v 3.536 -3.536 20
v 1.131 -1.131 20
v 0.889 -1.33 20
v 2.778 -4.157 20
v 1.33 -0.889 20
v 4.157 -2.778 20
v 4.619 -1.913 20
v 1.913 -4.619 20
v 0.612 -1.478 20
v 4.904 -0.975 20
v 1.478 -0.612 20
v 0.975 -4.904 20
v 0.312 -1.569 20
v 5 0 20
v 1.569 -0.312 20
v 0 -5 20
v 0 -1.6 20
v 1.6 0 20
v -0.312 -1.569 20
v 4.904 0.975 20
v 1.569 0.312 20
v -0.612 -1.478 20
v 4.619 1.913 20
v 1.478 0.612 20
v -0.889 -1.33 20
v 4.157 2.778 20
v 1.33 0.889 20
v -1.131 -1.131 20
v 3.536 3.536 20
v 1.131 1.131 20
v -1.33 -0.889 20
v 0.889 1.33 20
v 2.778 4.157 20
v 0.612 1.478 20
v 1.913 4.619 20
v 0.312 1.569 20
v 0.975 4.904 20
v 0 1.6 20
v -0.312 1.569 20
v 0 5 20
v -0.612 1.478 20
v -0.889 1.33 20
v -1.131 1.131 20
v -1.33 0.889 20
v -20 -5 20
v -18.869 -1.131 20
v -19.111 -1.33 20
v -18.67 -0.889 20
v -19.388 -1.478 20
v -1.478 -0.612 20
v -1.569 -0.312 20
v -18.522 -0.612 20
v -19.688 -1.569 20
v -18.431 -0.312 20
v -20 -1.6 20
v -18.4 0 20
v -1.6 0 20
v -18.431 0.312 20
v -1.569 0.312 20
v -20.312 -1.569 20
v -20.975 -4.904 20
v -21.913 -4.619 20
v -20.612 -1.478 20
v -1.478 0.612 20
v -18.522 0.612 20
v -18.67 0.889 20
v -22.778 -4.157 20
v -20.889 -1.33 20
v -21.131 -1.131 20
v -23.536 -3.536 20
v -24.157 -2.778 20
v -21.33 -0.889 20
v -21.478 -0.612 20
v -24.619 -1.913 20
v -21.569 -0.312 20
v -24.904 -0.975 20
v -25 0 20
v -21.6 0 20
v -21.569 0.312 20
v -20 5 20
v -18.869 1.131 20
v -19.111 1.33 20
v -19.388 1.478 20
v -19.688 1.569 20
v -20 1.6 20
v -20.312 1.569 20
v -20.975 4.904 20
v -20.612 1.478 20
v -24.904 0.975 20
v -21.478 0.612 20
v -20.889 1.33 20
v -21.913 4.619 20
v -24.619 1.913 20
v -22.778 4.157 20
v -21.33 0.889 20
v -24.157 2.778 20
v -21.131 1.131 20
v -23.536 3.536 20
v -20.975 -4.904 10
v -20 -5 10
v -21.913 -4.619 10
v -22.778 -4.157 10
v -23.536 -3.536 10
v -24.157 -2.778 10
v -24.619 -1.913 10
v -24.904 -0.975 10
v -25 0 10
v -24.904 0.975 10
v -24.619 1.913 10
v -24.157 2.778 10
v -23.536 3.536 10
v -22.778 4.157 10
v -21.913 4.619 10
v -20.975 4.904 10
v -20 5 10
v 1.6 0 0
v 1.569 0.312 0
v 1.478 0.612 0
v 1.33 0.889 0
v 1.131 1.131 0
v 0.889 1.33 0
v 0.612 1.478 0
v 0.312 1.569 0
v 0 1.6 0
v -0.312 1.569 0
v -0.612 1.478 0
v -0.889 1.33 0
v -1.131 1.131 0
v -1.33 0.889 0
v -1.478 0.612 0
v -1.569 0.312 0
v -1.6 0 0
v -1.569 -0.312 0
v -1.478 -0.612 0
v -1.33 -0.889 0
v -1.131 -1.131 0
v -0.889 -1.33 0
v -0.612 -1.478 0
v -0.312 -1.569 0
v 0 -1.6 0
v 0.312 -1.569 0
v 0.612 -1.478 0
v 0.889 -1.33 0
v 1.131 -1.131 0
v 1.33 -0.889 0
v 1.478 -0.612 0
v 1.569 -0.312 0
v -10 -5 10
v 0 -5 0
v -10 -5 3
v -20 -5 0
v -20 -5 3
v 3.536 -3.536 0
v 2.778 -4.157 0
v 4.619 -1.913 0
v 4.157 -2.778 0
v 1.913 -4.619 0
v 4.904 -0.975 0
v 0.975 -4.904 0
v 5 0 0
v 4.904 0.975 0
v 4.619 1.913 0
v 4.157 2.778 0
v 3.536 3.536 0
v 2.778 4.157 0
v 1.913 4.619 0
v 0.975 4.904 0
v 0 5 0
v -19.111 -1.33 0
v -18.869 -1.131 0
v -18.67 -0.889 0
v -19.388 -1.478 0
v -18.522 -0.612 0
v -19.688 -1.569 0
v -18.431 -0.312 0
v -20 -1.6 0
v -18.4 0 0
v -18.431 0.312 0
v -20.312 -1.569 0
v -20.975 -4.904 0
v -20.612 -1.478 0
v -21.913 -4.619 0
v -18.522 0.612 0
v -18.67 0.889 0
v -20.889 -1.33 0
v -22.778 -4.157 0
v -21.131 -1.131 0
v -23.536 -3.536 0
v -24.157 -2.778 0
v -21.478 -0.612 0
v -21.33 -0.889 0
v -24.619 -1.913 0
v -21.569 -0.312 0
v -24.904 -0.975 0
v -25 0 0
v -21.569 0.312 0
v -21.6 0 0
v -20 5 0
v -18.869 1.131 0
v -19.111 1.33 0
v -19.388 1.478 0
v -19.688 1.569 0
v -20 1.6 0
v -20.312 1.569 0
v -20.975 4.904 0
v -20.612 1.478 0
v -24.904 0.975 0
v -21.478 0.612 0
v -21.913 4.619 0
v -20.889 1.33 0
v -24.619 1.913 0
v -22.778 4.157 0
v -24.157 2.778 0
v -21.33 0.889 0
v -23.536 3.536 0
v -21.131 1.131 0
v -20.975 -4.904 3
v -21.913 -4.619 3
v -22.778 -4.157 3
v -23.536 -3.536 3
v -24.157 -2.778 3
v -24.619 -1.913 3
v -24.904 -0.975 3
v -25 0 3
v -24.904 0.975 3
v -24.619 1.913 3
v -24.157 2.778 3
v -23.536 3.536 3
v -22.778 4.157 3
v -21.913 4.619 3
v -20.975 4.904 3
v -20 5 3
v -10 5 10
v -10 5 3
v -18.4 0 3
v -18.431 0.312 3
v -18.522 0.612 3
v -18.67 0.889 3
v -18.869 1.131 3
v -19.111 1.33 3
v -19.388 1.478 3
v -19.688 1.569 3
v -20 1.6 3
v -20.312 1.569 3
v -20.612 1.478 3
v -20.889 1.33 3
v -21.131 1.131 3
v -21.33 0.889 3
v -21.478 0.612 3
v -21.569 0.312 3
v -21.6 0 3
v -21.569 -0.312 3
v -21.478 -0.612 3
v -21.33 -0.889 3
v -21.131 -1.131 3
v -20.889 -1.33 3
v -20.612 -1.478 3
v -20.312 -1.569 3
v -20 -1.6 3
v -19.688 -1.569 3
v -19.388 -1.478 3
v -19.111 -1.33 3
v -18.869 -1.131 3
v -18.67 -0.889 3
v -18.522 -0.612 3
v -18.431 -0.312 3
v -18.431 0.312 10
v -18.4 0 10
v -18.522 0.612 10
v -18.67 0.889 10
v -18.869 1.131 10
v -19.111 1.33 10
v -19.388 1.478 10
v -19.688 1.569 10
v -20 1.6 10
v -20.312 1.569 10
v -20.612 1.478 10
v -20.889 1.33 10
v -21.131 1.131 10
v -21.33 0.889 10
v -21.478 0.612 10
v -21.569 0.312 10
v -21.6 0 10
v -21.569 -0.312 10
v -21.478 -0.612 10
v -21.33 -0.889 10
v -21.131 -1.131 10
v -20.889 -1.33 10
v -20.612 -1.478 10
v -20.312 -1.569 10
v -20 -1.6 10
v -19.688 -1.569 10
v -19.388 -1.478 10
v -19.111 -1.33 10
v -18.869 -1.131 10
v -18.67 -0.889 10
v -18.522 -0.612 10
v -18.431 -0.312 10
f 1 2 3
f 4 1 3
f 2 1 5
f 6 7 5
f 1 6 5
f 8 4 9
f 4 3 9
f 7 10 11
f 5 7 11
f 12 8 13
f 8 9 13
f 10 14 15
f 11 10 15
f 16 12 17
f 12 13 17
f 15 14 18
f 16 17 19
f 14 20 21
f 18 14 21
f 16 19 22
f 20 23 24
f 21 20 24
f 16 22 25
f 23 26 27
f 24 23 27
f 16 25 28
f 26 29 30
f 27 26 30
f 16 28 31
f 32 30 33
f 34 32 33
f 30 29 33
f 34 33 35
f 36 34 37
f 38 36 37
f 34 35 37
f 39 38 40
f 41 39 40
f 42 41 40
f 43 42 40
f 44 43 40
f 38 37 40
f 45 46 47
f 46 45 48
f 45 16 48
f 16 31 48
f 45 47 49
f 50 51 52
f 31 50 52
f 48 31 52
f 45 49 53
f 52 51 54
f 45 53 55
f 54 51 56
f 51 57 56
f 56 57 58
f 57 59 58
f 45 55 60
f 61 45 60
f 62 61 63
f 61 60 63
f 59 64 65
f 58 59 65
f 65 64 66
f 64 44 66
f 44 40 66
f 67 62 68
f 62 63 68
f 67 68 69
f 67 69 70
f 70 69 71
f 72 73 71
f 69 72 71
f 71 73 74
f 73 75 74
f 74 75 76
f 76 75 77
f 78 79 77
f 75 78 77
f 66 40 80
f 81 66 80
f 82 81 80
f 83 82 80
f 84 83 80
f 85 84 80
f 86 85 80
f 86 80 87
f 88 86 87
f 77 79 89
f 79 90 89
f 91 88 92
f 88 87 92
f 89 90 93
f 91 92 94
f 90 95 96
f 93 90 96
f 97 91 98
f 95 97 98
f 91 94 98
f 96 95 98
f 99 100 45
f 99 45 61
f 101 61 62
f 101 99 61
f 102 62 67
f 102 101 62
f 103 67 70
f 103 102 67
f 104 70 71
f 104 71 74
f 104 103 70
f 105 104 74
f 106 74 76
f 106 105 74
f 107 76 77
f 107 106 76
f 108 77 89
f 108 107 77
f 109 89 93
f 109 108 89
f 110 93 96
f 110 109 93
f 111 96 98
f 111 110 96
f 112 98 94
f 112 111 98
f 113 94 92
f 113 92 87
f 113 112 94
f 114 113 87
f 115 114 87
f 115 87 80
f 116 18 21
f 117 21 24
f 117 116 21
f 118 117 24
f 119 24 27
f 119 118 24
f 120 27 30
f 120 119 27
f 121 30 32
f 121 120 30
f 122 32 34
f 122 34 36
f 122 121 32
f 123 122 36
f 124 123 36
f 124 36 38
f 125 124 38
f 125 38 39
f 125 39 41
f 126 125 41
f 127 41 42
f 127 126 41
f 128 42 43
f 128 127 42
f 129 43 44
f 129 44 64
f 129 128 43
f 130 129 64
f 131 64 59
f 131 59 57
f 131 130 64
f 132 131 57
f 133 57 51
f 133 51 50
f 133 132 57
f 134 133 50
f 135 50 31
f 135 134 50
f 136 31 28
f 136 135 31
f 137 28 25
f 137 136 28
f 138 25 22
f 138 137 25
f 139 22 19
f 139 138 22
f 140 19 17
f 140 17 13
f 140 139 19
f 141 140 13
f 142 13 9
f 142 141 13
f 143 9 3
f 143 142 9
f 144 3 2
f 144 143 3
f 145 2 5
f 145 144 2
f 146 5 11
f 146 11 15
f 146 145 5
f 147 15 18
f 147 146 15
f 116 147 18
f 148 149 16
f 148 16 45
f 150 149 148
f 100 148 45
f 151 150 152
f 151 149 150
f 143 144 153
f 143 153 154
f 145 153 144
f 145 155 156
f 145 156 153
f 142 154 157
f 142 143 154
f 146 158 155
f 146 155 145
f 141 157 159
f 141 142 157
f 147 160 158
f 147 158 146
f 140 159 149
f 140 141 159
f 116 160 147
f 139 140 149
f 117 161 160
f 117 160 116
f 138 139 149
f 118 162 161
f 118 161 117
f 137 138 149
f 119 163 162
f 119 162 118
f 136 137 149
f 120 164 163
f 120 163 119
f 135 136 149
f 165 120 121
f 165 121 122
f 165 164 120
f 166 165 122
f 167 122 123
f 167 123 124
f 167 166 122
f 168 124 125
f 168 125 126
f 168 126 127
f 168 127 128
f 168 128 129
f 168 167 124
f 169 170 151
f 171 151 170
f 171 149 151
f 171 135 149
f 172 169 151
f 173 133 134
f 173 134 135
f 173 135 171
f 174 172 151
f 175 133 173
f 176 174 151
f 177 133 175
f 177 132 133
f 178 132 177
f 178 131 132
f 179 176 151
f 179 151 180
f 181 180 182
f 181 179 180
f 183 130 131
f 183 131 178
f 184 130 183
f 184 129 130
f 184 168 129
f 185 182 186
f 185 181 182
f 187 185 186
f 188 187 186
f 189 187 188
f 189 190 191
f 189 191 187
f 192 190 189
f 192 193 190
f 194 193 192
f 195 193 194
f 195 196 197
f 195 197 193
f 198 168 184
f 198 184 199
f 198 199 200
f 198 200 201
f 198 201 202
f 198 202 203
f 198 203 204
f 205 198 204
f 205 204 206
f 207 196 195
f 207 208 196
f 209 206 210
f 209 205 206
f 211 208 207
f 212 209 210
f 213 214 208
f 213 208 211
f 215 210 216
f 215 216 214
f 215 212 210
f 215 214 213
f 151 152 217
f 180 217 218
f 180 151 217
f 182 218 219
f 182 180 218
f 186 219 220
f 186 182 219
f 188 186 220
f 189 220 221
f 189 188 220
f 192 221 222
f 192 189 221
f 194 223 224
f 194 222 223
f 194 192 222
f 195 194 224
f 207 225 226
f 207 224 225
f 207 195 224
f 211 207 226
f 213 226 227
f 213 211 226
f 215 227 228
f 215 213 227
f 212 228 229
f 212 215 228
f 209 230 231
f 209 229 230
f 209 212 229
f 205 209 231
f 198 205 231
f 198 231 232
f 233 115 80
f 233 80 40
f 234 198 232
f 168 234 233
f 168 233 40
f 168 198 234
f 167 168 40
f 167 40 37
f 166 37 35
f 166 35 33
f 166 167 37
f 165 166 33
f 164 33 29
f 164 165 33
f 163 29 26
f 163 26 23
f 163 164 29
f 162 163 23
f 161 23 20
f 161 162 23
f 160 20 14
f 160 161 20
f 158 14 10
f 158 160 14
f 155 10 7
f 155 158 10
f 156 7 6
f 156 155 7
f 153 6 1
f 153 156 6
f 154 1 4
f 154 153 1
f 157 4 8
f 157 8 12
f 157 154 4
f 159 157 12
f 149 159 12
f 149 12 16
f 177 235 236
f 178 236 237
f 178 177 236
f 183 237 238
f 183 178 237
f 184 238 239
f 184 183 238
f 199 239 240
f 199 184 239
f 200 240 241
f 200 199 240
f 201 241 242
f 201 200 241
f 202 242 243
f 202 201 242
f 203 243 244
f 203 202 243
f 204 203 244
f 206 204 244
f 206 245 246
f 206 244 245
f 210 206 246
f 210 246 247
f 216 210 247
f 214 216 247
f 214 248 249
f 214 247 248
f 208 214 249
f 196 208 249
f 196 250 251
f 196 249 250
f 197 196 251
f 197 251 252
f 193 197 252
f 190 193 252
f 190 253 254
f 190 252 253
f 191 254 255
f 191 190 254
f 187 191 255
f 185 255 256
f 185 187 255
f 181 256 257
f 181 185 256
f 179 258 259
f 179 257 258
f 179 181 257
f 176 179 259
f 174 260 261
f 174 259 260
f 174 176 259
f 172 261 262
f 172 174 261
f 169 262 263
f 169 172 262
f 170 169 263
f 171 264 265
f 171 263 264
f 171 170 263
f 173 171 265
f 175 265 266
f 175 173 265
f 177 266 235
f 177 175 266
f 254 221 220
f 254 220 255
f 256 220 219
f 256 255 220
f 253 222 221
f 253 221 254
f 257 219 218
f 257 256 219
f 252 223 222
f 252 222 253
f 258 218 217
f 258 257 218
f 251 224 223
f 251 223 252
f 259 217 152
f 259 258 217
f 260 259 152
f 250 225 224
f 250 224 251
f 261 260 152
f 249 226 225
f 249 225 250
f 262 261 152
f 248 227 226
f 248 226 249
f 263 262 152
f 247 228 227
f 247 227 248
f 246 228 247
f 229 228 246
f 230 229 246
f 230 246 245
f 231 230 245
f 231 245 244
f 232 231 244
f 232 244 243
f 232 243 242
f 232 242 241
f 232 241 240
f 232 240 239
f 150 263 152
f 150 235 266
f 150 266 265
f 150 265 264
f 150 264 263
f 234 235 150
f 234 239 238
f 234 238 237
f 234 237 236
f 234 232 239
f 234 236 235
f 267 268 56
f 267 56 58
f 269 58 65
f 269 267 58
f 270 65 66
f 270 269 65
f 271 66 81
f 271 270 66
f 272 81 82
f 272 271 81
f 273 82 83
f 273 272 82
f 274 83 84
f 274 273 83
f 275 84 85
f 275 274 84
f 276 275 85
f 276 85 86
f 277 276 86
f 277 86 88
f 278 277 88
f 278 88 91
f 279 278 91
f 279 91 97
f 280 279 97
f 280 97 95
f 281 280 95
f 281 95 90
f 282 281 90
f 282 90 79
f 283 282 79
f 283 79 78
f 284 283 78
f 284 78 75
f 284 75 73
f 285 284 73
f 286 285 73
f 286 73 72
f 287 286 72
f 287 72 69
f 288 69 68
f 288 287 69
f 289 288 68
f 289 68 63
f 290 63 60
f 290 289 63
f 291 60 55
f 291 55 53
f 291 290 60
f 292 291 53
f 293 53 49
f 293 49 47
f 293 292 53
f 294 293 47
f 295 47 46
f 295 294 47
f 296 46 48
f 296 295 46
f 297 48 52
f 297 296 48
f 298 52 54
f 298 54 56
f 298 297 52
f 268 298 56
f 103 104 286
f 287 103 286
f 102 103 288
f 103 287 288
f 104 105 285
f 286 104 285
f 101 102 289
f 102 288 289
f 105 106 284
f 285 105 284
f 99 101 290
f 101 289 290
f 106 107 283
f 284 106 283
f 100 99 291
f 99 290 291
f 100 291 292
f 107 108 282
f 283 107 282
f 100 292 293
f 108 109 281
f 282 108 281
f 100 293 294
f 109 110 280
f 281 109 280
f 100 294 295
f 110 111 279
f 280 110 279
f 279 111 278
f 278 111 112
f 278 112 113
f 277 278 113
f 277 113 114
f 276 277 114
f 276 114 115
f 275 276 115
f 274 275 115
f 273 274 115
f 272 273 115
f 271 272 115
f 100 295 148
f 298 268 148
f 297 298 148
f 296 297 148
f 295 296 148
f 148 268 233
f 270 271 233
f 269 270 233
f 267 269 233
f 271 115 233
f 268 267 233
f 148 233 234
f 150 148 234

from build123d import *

# Parameters (mm, degrees)
SKETCH1_R           = 1.6
BOSS_EXTRUDE1_DEPTH = 20
SKETCH2_W           = 15
SKETCH2_H           = 7
CUT_EXTRUDE1_DEPTH  = 34.541019662


with BuildPart() as part:
    # Sketch1 → Boss-Extrude1 (new body)
    with BuildSketch(Plane.XY):
        with BuildLine():
            Line((-20, 5), (0, 5))
            ThreePointArc((0, 5), (5, 0), (0, -5))
            Line((0, -5), (-20, -5))
            ThreePointArc((-20, -5), (-25, 0), (-20, 5))
        make_face()
        with Locations((-20, 0)):
            Circle(SKETCH1_R, mode=Mode.SUBTRACT)
        Circle(SKETCH1_R, mode=Mode.SUBTRACT)
    extrude(amount=BOSS_EXTRUDE1_DEPTH)

    # Sketch2 → Cut-Extrude1 (cut, through all)
    with BuildSketch(Plane(origin=(0, 5, 0), x_dir=(1, 0, 0), z_dir=(0, 1, 0))):
        with Locations((-17.5, -6.5)):
            Rectangle(SKETCH2_W, SKETCH2_H)
    extrude(amount=-CUT_EXTRUDE1_DEPTH, mode=Mode.SUBTRACT)


solid = part.part
